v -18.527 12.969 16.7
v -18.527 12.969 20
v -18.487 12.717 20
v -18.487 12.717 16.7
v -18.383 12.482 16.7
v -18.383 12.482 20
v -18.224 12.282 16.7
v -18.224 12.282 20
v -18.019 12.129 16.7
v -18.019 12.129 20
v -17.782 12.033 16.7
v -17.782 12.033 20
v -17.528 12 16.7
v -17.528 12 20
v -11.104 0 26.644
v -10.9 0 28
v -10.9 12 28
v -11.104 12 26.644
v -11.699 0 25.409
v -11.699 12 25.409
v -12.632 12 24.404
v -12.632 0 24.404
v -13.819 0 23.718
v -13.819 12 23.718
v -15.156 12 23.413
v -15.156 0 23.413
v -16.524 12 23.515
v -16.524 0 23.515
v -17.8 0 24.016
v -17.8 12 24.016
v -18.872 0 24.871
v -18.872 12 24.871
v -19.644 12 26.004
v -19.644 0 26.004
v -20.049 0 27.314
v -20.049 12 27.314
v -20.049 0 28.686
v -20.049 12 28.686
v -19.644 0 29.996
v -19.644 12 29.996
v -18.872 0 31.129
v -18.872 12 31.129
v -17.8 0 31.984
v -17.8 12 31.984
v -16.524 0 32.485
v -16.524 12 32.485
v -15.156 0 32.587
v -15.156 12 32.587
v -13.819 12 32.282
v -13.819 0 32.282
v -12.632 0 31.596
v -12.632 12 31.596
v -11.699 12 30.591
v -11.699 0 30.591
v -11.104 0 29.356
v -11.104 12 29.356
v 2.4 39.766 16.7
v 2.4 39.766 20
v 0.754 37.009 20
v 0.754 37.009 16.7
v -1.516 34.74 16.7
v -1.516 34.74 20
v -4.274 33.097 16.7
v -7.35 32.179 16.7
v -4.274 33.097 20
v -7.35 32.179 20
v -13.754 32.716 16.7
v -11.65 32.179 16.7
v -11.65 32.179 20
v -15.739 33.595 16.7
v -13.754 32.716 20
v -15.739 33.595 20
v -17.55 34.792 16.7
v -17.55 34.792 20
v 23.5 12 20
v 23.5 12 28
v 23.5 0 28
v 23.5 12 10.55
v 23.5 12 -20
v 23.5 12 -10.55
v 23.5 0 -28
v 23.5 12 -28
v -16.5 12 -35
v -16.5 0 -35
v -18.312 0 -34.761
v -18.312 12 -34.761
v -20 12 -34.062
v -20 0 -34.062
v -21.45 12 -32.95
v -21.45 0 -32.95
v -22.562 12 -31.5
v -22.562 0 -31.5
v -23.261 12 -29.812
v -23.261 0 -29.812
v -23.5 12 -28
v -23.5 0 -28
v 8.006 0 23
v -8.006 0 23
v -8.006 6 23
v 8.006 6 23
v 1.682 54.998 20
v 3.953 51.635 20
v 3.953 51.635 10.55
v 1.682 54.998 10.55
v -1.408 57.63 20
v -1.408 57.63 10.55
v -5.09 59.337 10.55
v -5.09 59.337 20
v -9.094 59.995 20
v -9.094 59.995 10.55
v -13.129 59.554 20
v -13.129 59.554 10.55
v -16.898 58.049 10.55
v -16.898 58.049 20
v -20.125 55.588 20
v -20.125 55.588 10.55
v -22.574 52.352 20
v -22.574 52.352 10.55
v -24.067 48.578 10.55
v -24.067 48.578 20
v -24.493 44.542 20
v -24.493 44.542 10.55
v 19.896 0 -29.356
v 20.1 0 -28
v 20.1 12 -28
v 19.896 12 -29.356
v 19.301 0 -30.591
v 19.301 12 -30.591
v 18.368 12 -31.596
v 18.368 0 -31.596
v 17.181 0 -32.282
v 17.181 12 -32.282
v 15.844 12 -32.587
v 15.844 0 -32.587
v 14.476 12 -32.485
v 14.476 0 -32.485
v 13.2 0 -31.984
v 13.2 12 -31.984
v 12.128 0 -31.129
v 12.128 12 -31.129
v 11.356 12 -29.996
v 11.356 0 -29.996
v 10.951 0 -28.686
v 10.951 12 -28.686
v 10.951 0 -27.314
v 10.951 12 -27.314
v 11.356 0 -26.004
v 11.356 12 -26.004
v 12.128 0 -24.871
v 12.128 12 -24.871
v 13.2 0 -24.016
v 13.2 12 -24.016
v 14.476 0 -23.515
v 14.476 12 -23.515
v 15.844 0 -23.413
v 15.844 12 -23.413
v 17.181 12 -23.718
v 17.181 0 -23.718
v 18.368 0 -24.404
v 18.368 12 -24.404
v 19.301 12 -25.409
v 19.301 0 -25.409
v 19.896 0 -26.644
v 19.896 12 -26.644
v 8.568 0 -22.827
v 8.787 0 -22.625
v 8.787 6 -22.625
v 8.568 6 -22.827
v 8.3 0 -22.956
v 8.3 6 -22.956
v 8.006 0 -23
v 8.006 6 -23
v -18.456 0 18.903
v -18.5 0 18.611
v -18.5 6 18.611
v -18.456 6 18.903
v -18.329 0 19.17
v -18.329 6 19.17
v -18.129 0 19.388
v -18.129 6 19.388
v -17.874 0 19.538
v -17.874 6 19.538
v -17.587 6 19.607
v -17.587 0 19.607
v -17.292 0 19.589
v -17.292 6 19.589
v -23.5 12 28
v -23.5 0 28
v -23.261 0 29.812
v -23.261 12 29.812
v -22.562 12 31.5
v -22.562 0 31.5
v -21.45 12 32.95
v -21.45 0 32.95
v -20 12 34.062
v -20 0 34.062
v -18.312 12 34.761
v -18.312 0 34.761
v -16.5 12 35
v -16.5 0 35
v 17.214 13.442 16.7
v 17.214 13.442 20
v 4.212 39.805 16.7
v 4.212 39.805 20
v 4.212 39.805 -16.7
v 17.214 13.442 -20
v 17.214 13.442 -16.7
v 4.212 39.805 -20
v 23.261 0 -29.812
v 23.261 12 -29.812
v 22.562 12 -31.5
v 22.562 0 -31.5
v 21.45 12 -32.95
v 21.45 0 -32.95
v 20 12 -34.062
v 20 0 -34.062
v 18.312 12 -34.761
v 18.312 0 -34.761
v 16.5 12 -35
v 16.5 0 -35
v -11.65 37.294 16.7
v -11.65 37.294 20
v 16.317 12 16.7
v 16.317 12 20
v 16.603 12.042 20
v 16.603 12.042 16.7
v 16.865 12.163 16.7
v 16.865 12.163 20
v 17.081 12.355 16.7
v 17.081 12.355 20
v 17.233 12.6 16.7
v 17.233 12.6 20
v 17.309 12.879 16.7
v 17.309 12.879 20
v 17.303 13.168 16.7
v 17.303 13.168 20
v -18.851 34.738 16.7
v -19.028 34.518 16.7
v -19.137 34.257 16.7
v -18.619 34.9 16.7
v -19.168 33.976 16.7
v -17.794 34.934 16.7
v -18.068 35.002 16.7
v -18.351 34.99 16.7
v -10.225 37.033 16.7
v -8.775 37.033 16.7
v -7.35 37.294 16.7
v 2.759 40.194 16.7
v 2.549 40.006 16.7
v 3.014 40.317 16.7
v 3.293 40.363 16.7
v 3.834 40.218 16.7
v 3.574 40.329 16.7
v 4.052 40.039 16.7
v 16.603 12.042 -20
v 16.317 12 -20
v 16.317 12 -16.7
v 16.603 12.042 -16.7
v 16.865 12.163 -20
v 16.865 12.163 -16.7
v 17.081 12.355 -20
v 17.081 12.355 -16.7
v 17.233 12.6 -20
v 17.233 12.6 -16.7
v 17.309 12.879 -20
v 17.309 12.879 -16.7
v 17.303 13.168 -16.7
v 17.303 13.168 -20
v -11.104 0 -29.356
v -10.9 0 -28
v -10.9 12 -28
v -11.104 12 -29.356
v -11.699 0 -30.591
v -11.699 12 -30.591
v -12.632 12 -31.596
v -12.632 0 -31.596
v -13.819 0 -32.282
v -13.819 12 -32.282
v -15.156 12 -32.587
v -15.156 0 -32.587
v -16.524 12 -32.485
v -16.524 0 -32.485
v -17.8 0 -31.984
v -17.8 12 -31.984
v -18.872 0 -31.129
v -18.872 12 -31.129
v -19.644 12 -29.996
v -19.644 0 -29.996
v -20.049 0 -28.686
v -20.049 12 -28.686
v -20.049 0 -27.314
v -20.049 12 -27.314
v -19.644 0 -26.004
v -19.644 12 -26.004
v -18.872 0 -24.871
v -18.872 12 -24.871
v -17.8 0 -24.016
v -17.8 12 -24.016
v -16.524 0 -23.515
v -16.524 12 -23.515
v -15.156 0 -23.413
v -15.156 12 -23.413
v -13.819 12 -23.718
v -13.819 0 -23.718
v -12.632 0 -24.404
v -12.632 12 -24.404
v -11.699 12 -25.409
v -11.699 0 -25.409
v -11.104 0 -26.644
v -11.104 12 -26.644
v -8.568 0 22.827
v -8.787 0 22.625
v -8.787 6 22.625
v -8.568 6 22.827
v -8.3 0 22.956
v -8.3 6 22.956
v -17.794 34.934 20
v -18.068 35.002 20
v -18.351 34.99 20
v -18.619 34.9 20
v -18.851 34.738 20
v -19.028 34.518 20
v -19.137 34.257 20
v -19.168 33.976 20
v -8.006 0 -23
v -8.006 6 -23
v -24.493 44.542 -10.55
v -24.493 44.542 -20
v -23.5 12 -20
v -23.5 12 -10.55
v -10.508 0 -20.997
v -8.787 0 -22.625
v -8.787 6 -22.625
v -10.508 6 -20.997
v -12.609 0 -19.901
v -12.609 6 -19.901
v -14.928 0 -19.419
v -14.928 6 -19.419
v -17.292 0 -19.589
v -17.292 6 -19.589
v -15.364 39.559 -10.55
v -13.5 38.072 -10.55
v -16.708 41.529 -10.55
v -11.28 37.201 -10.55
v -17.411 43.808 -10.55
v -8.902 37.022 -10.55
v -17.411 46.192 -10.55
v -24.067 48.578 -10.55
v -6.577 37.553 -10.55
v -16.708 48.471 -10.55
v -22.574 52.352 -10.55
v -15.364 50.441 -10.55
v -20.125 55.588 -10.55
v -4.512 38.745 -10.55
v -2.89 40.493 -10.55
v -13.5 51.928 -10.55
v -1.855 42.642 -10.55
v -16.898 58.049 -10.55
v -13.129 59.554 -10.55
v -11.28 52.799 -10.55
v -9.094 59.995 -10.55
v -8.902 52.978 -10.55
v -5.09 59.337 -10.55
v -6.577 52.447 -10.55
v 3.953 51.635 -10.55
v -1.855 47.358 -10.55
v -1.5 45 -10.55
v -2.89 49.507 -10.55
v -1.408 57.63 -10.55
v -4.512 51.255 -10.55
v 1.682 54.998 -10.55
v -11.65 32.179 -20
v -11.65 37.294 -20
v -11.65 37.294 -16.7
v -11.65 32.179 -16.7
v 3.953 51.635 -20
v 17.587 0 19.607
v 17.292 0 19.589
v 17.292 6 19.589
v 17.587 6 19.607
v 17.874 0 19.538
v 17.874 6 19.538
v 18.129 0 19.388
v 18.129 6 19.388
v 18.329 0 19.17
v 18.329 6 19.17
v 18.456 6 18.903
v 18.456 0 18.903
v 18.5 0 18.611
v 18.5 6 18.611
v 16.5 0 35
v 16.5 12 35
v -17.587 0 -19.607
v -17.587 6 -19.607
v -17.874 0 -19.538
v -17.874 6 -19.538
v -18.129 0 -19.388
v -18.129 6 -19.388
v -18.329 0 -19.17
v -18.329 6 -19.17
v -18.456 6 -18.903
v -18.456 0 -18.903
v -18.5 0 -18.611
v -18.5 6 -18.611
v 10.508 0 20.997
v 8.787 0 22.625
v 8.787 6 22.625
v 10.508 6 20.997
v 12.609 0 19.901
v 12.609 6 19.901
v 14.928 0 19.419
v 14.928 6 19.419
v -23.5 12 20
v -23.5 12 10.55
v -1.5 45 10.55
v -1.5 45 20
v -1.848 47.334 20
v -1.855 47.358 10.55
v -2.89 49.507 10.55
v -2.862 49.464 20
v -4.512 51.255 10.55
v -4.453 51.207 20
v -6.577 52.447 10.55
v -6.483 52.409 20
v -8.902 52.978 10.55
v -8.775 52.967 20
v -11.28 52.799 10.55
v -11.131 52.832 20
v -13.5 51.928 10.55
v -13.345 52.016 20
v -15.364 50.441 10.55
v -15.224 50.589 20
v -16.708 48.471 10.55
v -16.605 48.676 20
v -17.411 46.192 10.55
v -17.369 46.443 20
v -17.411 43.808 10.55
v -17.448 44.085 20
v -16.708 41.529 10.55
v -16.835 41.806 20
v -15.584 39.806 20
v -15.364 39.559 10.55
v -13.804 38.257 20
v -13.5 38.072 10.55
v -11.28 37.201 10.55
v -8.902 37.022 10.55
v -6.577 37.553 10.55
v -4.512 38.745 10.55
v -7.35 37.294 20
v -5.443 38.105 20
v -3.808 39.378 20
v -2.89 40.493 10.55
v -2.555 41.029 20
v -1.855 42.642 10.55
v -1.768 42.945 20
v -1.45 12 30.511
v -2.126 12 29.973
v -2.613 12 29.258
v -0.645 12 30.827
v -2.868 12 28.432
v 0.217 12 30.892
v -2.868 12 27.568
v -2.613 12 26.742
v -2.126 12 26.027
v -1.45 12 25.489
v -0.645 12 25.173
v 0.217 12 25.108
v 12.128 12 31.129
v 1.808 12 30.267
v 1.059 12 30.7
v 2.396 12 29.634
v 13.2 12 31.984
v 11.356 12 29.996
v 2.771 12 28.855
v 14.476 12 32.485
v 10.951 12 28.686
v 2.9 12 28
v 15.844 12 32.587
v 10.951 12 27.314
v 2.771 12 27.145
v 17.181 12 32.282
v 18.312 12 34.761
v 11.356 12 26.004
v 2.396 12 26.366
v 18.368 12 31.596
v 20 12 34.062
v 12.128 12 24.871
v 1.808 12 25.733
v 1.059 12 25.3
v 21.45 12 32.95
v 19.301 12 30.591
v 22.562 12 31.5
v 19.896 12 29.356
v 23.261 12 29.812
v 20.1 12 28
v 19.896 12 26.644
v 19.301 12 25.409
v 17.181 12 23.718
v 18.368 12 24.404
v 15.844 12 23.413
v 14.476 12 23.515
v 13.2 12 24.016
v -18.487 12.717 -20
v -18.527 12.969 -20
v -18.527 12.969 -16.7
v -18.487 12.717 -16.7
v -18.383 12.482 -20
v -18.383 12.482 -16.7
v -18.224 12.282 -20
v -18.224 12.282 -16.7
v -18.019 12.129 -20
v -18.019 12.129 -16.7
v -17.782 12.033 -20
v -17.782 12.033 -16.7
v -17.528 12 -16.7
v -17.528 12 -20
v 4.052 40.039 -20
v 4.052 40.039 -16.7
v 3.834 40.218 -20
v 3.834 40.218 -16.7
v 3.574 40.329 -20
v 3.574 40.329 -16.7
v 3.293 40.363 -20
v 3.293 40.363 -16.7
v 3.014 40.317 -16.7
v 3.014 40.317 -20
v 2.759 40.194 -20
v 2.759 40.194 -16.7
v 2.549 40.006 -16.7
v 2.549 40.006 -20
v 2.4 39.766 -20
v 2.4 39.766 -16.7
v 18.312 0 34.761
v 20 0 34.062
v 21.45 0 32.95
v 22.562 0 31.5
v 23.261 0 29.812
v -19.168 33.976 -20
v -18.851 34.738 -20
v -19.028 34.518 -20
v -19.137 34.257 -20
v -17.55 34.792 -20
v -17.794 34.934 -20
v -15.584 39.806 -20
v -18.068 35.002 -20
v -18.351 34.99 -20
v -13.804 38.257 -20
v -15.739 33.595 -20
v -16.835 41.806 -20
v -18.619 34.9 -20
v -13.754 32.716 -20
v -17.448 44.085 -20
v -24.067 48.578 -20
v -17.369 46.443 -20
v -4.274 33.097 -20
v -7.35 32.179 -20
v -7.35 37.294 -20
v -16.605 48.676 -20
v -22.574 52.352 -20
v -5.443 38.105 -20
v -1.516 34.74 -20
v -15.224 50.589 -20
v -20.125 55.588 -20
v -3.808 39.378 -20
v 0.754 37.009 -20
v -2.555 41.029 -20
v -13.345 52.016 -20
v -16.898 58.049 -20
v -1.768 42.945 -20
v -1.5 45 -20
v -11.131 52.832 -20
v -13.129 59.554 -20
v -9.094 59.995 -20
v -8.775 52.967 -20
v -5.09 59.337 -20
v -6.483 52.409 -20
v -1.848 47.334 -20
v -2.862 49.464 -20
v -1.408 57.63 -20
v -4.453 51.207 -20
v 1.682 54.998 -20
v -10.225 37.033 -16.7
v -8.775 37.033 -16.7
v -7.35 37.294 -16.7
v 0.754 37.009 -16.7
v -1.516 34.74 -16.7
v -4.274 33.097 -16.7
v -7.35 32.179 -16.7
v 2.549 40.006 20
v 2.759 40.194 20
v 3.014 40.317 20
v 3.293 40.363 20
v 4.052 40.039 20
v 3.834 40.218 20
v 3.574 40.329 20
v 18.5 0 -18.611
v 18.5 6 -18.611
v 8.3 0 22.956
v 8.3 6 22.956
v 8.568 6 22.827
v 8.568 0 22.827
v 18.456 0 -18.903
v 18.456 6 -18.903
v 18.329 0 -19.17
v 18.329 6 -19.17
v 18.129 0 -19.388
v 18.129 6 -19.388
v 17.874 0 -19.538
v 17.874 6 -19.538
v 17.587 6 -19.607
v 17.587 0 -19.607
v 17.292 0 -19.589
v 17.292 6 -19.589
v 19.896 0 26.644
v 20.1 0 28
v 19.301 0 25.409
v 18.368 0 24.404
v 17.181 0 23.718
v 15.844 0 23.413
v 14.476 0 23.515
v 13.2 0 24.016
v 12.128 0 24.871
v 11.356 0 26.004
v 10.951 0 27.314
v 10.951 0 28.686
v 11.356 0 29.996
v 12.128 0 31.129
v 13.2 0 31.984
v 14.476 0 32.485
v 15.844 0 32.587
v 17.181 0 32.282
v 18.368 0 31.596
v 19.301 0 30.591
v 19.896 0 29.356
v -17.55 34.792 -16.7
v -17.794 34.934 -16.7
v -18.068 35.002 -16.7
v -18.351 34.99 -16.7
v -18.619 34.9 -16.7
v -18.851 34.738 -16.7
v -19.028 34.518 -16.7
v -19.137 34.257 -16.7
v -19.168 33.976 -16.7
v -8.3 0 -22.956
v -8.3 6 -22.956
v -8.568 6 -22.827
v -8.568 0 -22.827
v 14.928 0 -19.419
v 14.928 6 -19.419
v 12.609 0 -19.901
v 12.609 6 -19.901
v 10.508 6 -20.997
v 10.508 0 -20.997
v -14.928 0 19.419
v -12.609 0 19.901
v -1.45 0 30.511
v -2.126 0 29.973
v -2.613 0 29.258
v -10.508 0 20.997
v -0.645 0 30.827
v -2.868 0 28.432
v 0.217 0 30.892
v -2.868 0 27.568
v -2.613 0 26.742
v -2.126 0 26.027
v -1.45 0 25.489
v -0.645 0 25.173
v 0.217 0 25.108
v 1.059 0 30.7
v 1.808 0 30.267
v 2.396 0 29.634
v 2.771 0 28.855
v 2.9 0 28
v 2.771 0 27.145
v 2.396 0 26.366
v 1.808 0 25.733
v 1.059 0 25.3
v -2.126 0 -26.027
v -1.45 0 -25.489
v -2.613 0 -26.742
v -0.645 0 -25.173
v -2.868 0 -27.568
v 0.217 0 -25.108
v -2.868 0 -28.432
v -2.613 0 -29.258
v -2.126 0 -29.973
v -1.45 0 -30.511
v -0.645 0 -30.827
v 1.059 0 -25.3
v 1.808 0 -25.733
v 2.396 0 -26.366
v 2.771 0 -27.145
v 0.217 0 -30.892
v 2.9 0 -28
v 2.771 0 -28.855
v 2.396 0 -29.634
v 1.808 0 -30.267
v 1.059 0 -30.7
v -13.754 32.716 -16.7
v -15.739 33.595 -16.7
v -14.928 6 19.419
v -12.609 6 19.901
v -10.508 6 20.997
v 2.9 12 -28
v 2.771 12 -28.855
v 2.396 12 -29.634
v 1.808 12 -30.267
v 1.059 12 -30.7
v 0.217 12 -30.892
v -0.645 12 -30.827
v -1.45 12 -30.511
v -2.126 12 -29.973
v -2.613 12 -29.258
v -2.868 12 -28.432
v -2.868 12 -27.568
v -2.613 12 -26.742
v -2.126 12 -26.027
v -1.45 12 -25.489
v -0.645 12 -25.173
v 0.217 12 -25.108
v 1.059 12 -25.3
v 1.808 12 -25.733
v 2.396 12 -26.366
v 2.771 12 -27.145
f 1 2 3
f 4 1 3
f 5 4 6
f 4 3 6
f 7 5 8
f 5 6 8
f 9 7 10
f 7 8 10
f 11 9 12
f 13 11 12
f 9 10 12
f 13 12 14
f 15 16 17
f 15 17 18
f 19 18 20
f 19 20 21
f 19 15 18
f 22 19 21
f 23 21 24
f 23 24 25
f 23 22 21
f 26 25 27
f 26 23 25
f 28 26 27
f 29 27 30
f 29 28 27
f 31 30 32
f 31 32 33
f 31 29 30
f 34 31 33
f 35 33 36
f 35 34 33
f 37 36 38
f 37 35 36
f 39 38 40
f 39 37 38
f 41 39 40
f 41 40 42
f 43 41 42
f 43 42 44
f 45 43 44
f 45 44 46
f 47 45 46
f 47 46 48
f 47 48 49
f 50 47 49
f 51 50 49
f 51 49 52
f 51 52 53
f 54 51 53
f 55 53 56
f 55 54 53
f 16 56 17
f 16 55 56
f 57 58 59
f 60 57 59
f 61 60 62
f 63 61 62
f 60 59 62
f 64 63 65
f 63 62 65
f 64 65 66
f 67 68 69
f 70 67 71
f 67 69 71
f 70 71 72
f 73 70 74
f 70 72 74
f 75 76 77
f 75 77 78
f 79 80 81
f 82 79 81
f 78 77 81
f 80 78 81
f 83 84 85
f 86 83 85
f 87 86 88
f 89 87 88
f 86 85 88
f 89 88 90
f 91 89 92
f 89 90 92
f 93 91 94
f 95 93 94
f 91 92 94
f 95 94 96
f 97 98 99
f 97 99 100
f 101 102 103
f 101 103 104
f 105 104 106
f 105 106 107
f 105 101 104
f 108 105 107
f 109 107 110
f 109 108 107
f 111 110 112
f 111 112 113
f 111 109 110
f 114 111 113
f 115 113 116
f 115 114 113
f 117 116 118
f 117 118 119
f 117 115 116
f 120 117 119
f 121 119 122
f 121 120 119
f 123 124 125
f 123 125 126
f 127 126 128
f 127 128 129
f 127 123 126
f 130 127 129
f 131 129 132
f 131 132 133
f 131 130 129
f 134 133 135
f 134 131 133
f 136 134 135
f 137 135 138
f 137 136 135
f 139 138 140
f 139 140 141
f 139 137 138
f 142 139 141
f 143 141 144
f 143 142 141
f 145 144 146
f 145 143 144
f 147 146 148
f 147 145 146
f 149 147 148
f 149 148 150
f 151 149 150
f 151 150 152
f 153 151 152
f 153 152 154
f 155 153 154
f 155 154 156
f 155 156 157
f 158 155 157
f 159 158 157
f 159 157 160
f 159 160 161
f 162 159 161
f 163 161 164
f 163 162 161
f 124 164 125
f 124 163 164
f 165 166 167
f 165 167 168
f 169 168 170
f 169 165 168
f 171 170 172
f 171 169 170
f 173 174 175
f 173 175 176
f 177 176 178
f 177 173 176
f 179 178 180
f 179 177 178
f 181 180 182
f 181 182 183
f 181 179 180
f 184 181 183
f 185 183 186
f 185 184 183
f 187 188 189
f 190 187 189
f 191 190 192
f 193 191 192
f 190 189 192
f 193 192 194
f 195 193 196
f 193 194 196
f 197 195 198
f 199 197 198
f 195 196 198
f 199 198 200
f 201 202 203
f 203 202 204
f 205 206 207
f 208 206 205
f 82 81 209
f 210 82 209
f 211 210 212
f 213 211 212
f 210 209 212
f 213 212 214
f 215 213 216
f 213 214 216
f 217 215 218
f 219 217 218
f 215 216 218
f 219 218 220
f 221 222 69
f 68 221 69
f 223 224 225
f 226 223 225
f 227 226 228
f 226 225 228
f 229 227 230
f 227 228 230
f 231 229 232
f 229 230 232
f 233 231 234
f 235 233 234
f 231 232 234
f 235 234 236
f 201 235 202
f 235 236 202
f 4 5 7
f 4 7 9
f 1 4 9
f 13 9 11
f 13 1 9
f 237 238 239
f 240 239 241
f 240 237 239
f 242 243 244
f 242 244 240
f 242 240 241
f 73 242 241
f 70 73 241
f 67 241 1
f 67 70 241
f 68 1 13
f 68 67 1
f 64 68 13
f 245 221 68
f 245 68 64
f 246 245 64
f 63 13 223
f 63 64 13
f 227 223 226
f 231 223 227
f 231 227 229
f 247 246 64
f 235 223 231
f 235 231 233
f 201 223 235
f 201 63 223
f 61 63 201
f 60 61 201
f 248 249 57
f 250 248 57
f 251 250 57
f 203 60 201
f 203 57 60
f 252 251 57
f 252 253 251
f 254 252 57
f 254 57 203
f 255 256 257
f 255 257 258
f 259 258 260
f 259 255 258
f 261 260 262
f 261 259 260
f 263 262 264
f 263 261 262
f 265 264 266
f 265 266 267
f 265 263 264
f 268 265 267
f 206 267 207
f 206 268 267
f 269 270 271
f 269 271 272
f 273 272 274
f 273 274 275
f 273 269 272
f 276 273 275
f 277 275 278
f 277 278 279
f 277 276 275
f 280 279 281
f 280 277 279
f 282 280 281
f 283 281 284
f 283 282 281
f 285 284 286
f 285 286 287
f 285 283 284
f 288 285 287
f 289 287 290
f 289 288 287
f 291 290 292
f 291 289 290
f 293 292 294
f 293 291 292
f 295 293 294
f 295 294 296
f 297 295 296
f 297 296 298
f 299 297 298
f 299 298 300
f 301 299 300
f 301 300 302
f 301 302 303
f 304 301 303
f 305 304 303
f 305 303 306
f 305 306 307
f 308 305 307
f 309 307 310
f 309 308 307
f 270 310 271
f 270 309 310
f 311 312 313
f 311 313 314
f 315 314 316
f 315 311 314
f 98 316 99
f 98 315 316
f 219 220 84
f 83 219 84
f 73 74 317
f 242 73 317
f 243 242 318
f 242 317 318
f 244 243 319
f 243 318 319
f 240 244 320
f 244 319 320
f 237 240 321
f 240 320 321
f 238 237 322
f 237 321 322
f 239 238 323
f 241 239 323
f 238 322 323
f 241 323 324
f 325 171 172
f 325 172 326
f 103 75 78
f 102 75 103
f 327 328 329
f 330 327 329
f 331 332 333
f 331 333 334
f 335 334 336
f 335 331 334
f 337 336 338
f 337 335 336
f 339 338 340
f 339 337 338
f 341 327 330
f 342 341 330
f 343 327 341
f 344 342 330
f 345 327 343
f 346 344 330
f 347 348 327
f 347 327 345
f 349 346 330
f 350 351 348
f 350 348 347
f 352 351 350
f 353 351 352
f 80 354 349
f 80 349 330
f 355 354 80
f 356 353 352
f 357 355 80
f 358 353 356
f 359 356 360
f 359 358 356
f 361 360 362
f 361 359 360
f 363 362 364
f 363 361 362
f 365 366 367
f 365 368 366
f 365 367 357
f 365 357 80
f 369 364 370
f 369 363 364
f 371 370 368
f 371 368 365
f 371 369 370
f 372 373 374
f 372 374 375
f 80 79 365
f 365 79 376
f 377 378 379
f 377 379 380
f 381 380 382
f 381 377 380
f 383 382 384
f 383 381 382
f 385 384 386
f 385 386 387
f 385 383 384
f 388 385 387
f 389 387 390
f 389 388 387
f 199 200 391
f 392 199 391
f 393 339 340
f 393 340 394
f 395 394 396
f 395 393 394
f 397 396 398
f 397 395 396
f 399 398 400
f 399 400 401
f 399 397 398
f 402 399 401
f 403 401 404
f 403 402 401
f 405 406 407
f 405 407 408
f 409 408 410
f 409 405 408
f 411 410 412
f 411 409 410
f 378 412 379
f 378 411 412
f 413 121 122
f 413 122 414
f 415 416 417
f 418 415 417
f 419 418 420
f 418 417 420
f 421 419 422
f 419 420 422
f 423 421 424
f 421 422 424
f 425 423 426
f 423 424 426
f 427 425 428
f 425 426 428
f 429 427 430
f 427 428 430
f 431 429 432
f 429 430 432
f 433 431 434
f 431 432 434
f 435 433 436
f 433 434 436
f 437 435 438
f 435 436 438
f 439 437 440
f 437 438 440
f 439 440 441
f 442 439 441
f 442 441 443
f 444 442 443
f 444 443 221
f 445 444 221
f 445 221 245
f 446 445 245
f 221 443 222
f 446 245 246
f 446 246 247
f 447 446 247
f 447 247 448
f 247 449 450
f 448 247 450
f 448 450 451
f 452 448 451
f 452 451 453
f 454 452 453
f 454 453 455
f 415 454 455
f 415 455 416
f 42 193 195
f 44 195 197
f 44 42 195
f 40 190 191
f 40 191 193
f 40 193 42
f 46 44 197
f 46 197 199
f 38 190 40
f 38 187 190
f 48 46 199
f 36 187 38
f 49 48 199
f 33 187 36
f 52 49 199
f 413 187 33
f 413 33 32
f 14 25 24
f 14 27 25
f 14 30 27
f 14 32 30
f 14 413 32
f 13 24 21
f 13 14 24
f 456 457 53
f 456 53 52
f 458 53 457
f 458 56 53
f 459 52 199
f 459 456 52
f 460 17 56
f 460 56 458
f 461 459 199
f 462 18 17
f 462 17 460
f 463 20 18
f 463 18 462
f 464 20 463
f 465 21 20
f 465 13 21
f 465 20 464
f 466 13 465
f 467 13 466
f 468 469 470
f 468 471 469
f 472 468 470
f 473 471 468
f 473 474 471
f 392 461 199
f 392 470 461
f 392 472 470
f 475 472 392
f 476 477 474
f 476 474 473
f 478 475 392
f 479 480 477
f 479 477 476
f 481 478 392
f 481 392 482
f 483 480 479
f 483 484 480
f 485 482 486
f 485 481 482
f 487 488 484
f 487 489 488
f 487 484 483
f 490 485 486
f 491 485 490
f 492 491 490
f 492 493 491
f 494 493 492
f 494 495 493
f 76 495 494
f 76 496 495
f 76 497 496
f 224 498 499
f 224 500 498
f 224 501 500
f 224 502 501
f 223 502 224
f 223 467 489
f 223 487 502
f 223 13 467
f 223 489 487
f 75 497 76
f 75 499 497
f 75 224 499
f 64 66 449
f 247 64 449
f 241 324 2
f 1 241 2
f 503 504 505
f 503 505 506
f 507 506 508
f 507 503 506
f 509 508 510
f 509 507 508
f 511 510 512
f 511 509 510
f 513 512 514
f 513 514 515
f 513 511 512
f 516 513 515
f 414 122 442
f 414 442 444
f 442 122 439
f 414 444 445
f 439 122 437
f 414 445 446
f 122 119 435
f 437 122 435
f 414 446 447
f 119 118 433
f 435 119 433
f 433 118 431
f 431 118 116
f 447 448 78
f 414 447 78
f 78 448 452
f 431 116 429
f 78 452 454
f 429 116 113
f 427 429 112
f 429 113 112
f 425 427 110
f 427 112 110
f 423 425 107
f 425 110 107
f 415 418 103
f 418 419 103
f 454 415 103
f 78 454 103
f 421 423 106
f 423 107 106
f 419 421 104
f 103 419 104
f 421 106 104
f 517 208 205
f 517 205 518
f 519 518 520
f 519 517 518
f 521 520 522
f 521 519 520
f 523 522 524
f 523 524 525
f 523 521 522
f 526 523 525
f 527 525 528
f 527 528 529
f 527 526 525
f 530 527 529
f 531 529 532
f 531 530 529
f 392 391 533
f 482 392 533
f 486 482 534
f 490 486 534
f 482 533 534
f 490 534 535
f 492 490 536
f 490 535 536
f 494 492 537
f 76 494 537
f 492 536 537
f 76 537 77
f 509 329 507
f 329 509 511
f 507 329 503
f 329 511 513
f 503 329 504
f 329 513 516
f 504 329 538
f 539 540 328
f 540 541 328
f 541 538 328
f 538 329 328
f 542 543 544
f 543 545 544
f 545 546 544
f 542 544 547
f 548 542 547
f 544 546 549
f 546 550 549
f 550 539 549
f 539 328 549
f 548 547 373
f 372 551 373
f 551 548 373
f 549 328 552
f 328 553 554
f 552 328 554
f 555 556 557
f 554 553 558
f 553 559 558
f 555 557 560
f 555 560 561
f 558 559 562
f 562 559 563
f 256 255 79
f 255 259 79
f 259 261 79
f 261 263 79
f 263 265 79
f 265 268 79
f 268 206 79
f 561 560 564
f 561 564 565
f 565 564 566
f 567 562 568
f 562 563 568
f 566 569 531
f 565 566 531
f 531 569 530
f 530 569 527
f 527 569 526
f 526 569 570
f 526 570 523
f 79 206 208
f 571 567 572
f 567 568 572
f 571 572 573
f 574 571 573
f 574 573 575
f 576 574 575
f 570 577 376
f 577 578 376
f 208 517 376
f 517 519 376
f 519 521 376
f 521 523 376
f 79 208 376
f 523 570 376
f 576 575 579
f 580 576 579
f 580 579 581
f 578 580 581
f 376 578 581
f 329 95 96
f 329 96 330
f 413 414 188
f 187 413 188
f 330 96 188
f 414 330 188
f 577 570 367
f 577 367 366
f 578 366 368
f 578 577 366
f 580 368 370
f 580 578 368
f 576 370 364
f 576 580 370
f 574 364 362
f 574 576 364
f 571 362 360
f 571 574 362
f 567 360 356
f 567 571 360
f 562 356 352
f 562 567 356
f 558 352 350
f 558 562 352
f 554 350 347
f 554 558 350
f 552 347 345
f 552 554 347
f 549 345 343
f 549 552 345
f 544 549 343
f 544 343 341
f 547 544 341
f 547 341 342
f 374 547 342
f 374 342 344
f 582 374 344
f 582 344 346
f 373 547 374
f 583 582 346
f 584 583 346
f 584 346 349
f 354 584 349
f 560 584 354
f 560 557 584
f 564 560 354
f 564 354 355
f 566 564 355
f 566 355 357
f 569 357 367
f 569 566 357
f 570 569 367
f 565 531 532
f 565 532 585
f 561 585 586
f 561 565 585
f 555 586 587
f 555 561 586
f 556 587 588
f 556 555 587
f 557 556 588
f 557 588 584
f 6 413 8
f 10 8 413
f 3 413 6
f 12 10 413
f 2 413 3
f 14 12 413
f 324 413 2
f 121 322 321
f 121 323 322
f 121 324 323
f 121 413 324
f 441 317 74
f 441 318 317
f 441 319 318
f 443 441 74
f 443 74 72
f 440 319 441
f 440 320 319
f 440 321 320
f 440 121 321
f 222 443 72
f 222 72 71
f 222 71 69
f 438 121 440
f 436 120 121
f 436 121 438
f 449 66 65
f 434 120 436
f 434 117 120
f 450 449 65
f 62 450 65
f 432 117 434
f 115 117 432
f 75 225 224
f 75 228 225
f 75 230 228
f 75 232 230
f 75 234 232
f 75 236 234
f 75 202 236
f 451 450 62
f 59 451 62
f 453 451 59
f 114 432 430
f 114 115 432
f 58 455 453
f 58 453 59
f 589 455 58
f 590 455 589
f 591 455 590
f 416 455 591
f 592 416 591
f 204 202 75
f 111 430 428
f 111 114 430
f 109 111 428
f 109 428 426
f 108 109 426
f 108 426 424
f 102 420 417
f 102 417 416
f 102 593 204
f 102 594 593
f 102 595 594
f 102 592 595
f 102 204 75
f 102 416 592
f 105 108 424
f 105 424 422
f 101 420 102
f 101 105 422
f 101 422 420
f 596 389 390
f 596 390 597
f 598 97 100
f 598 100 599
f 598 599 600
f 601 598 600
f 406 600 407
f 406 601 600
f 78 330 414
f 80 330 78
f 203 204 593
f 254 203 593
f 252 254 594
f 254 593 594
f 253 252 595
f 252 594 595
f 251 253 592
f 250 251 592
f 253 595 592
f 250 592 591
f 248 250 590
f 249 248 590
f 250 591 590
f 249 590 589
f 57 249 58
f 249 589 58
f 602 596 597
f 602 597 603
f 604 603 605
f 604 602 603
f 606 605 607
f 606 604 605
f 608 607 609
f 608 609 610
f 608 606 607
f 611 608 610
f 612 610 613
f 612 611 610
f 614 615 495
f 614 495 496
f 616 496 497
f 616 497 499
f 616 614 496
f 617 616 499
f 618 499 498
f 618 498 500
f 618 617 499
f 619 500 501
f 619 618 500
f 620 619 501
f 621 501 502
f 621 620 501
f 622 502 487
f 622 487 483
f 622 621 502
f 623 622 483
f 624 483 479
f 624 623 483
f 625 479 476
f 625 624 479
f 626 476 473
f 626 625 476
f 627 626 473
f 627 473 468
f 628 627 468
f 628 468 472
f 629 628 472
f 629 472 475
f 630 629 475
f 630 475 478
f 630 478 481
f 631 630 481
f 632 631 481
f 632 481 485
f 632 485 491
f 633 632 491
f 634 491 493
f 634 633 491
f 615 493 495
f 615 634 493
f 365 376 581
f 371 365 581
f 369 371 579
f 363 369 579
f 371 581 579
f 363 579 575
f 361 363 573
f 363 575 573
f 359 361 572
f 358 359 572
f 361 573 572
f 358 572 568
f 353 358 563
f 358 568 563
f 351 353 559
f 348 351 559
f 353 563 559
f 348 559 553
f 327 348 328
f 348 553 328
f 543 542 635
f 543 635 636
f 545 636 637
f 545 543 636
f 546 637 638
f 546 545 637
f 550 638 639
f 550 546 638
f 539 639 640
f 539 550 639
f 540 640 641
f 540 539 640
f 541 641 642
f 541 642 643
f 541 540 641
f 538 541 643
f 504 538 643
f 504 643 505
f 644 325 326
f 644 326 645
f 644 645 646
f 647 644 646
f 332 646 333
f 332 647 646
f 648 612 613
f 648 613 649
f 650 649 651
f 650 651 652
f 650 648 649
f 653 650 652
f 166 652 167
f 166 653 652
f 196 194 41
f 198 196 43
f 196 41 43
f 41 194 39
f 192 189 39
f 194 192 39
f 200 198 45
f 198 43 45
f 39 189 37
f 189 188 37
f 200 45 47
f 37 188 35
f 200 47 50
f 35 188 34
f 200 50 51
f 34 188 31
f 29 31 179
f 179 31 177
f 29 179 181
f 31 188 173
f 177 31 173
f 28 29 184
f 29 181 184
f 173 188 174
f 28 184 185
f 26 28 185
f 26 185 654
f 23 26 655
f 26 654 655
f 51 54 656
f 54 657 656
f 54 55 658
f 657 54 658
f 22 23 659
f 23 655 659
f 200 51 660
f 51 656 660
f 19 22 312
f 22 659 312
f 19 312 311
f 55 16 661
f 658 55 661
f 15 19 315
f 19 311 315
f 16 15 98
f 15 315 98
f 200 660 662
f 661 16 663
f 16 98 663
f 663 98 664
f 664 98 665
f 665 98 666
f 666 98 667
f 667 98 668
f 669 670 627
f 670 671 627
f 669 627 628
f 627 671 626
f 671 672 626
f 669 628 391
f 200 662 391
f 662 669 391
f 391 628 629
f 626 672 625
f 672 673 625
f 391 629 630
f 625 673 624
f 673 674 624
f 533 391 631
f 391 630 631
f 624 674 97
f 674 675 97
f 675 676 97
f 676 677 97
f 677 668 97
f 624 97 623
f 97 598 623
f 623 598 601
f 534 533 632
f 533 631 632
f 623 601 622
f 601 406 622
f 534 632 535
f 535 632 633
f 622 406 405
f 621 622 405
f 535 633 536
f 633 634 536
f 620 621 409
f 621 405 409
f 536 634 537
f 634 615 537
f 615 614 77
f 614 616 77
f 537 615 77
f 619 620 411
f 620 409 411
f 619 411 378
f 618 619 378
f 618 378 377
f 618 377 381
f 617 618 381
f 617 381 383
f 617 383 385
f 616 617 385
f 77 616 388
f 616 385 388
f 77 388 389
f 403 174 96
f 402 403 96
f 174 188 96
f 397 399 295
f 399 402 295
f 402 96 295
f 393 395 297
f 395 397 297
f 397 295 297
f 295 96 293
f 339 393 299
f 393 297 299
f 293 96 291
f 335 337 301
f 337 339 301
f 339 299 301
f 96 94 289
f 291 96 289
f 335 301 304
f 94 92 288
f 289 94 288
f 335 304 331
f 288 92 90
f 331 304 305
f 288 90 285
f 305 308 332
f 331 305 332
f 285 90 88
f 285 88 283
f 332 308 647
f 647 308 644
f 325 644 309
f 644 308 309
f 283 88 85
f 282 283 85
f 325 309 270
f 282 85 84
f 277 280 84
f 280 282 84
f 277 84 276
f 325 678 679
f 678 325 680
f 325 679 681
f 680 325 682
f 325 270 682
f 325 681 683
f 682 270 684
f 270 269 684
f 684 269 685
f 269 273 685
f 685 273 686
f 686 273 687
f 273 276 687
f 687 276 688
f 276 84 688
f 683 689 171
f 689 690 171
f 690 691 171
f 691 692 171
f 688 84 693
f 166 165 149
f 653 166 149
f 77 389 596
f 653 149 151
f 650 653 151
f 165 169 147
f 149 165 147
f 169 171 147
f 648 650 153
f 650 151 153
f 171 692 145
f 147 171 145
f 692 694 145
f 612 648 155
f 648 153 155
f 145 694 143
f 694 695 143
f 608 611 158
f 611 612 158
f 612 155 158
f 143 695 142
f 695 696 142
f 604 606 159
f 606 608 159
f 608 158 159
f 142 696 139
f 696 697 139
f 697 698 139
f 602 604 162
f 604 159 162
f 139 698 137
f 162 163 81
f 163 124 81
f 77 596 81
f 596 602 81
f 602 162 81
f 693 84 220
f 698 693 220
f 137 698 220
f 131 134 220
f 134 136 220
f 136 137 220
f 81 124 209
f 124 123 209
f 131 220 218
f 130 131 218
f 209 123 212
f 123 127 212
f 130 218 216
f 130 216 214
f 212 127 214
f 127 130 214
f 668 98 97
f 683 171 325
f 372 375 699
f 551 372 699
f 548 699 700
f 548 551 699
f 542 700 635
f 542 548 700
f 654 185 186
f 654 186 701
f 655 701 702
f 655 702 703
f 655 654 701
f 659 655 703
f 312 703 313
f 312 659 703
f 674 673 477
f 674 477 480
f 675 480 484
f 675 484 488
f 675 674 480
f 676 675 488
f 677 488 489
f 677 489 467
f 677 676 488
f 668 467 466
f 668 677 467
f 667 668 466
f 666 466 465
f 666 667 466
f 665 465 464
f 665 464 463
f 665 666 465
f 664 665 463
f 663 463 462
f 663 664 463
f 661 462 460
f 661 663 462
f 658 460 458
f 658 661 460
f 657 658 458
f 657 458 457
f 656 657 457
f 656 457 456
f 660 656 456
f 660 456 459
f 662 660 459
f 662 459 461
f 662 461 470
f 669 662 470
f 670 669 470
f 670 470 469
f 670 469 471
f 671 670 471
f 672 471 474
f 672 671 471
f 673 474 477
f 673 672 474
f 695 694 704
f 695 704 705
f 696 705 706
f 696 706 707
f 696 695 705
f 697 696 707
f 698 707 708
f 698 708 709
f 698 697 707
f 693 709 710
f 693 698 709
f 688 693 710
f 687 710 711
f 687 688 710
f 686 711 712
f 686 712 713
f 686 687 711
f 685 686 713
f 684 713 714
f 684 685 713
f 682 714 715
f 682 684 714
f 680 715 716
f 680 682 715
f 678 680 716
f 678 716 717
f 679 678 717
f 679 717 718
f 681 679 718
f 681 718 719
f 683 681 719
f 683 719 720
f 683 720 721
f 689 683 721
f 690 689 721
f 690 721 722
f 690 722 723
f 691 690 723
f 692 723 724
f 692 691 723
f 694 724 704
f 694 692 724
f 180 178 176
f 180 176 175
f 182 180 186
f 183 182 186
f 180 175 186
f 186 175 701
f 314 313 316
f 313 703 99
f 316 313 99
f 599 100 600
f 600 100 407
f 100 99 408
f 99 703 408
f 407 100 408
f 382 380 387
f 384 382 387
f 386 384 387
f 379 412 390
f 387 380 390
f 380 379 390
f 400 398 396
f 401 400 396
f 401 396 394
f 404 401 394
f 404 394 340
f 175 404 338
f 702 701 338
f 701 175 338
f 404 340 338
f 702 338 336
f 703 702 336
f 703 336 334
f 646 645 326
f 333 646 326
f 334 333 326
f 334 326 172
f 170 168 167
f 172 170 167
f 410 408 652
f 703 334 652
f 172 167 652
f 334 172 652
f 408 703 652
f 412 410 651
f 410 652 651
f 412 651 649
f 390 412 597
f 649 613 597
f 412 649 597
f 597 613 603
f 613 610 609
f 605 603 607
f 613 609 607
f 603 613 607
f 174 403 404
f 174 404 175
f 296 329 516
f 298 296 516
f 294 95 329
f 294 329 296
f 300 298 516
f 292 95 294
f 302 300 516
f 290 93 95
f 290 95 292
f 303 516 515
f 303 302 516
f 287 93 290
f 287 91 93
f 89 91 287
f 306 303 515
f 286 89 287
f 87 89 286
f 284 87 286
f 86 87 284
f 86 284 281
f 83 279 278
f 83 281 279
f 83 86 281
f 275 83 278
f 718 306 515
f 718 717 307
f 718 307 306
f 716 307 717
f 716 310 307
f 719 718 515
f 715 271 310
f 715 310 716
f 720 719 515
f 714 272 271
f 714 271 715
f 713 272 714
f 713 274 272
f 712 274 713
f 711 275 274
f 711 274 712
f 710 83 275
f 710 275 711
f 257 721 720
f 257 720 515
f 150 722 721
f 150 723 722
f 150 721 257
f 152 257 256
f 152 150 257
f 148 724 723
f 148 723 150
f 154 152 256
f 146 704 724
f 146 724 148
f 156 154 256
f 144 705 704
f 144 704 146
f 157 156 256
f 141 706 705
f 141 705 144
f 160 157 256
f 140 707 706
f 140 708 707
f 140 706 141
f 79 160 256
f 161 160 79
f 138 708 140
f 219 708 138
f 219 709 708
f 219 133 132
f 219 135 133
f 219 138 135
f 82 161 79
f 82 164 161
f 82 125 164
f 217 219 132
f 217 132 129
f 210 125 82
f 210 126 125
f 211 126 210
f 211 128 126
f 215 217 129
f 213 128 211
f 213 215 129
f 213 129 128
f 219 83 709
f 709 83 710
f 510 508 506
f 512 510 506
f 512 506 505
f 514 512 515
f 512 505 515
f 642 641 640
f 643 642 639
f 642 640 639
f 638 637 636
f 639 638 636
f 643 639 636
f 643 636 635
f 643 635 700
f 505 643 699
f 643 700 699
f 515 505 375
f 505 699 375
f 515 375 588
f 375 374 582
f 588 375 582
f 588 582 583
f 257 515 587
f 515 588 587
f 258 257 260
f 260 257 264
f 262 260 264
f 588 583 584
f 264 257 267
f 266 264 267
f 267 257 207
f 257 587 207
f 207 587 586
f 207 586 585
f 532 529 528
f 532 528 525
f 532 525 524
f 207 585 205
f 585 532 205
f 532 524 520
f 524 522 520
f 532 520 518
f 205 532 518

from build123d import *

# Parameters (mm, degrees)
SKETCH1_R               = 4.6
SKETCH1_R_2             = 2.9
BOSS_EXTRUDE1_DEPTH     = 12
CUT_EXTRUDE1_DEPTH      = 6
SKETCH3_R               = 8
BOSS_EXTRUDE2_DEPTH     = 9.45
CUT_EXTRUDE2_DEPTH      = 3.3
SKETCH5_R               = 8
BOSS_EXTRUDE3_DEPTH     = 9.45
CUT_EXTRUDE3_DEPTH      = 3.3
CUT_EXTRUDE4_DEPTH      = 3.3
CUT_EXTRUDE4_DEPTH_BACK = 3.3
CUT_EXTRUDE5_DEPTH      = 3.3
CUT_EXTRUDE5_DEPTH_BACK = 3.3


with BuildPart() as part:
    # Sketch1 → Boss-Extrude1 (new body)
    with BuildSketch(Plane(origin=(0, 0, 0), x_dir=(1, 0, 0), z_dir=(0, 1, 0))):
        with BuildLine():
            Line((-16.5, -35), (16.5, -35))
            ThreePointArc((16.5, -35), (21.449747468, -32.949747468), (23.5, -28))
            Line((23.5, -28), (23.5, 28))
            ThreePointArc((23.5, 28), (21.449747468, 32.949747468), (16.5, 35))
            Line((16.5, 35), (-16.5, 35))
            ThreePointArc((-16.5, 35), (-21.449747468, 32.949747468), (-23.5, 28))
            Line((-23.5, 28), (-23.5, -28))
            ThreePointArc((-23.5, -28), (-21.449747468, -32.949747468), (-16.5, -35))
        make_face()
        with Locations((15.5, 28)):
            Circle(SKETCH1_R, mode=Mode.SUBTRACT)
        with Locations((15.5, -28)):
            Circle(SKETCH1_R, mode=Mode.SUBTRACT)
        with Locations((0, 28)):
            Circle(SKETCH1_R_2, mode=Mode.SUBTRACT)
        with Locations((0, -28)):
            Circle(SKETCH1_R_2, mode=Mode.SUBTRACT)
        with Locations((-15.5, 28)):
            Circle(SKETCH1_R, mode=Mode.SUBTRACT)
        with Locations((-15.5, -28)):
            Circle(SKETCH1_R, mode=Mode.SUBTRACT)
    extrude(amount=BOSS_EXTRUDE1_DEPTH)

    # Sketch2 → Cut-Extrude1 (cut)
    with BuildSketch(Plane(origin=(0, 0, 0), x_dir=(1, 0, 0), z_dir=(0, 1, 0))):
        with BuildLine():
            Line((-8.006002402, -23), (8.006002402, -23))
            ThreePointArc((8.006002402, -23), (8.439015104, -22.901387819), (8.786627152, -22.625))
            ThreePointArc((8.786627152, -22.625), (12.608534281, -19.900652743), (17.291666667, -19.588702207))
            ThreePointArc((17.291666667, -19.588702207), (18.12915287, -19.387925912), (18.5, -18.610644325))
            Line((18.5, -18.610644325), (18.5, 18.610644325))
            ThreePointArc((18.5, 18.610644325), (18.129152893, 19.387925893), (17.291666727, 19.58870222))
            ThreePointArc((17.291666727, 19.58870222), (12.60853431, 19.900652732), (8.786627152, 22.625))
            ThreePointArc((8.786627152, 22.625), (8.439015104, 22.901387819), (8.006002402, 23))
            Line((8.006002402, 23), (-8.006002402, 23))
            ThreePointArc((-8.006002402, 23), (-8.439015104, 22.901387819), (-8.786627152, 22.625))
            ThreePointArc((-8.786627152, 22.625), (-12.608534281, 19.900652743), (-17.291666667, 19.588702207))
            ThreePointArc((-17.291666667, 19.588702207), (-18.12915287, 19.387925912), (-18.5, 18.610644325))
            Line((-18.5, 18.610644325), (-18.5, -18.610644325))
            ThreePointArc((-18.5, -18.610644325), (-18.129152893, -19.387925893), (-17.291666727, -19.58870222))
            ThreePointArc((-17.291666727, -19.58870222), (-12.60853431, -19.900652732), (-8.786627152, -22.625))
            ThreePointArc((-8.786627152, -22.625), (-8.439015104, -22.901387819), (-8.006002402, -23))
        make_face()
    extrude(amount=CUT_EXTRUDE1_DEPTH, mode=Mode.SUBTRACT)

    # Sketch3 → Boss-Extrude2 (add)
    with BuildSketch(Plane.XY.offset(20)):
        with BuildLine():
            Line((-24.493021315, 44.542493891), (-23.5, 12))
            Line((-23.5, 12), (23.5, 12))
            Line((23.5, 12), (3.952899906, 51.634718088))
            ThreePointArc((3.952899906, 51.634718088), (-13.128760739, 59.554452772), (-24.493021315, 44.542493891))
        make_face()
        with Locations((-9.5, 45)):
            Circle(SKETCH3_R, mode=Mode.SUBTRACT)
    extrude(amount=-BOSS_EXTRUDE2_DEPTH)

    # Sketch4 → Cut-Extrude2 (cut)
    with BuildSketch(Plane.XY.offset(20)):
        with BuildLine():
            Line((-19.168267115, 33.976179837), (-18.527256585, 12.969499593))
            ThreePointArc((-18.527256585, 12.969499593), (-18.223961586, 12.282190691), (-17.527721831, 12))
            Line((-17.527721831, 12), (16.316811337, 12))
            ThreePointArc((16.316811337, 12), (17.166021129, 12.471944387), (17.213671331, 13.442314539))
            Line((17.213671331, 13.442314539), (4.211894935, 39.805393442))
            ThreePointArc((4.211894935, 39.805393442), (3.293145866, 40.362839309), (2.399675303, 39.765716124))
            ThreePointArc((2.399675303, 39.765716124), (-6.355074026, 32.386140931), (-17.549537192, 34.791917369))
            ThreePointArc((-17.549537192, 34.791917369), (-18.618756227, 34.899696772), (-19.168267115, 33.976179837))
        make_face()
    extrude(amount=-CUT_EXTRUDE2_DEPTH, mode=Mode.SUBTRACT)

    # Sketch5 → Boss-Extrude3 (add)
    with BuildSketch(Plane.XY.offset(-20)):
        with BuildLine():
            Line((-24.493021315, 44.542493891), (-23.5, 12))
            Line((-23.5, 12), (23.5, 12))
            Line((23.5, 12), (3.952899906, 51.634718088))
            ThreePointArc((3.952899906, 51.634718088), (-13.128760739, 59.554452772), (-24.493021315, 44.542493891))
        make_face()
        with Locations((-9.5, 45)):
            Circle(SKETCH5_R, mode=Mode.SUBTRACT)
    extrude(amount=BOSS_EXTRUDE3_DEPTH)

    # Sketch6 → Cut-Extrude3 (cut)
    with BuildSketch(Plane.XY.offset(-20)):
        with BuildLine():
            Line((-19.168267115, 33.976179837), (-18.527256585, 12.969499593))
            ThreePointArc((-18.527256585, 12.969499593), (-18.223961586, 12.282190691), (-17.527721831, 12))
            Line((-17.527721831, 12), (16.316811337, 12))
            ThreePointArc((16.316811337, 12), (17.166021129, 12.471944387), (17.213671331, 13.442314539))
            Line((17.213671331, 13.442314539), (4.211894935, 39.805393442))
            ThreePointArc((4.211894935, 39.805393442), (3.293145866, 40.362839309), (2.399675303, 39.765716124))
            ThreePointArc((2.399675303, 39.765716124), (-6.355074026, 32.386140931), (-17.549537192, 34.791917369))
            ThreePointArc((-17.549537192, 34.791917369), (-18.618756227, 34.899696772), (-19.168267115, 33.976179837))
        make_face()
    extrude(amount=CUT_EXTRUDE3_DEPTH, mode=Mode.SUBTRACT)

    # Sketch7 → Cut-Extrude4 (cut, two sides)
    with BuildSketch(Plane.XY.offset(20)) as cut_extrude4_sk:
        with BuildLine():
            Line((-7.35, 30.15), (-7.35, 45))
            Line((-7.35, 45), (-11.65, 45))
            Line((-11.65, 45), (-11.65, 30.15))
            ThreePointArc((-11.65, 30.15), (-9.5, 28), (-7.35, 30.15))
        make_face()
    extrude(amount=CUT_EXTRUDE4_DEPTH, mode=Mode.SUBTRACT)
    extrude(cut_extrude4_sk.sketch, amount=-CUT_EXTRUDE4_DEPTH_BACK, mode=Mode.SUBTRACT)

    # Sketch8 → Cut-Extrude5 (cut, two sides)
    with BuildSketch(Plane.XY.offset(-20)) as cut_extrude5_sk:
        with BuildLine():
            Line((-7.35, 30.15), (-7.35, 45))
            Line((-7.35, 45), (-11.65, 45))
            Line((-11.65, 45), (-11.65, 30.15))
            ThreePointArc((-11.65, 30.15), (-9.5, 28), (-7.35, 30.15))
        make_face()
    extrude(amount=CUT_EXTRUDE5_DEPTH, mode=Mode.SUBTRACT)
    extrude(cut_extrude5_sk.sketch, amount=-CUT_EXTRUDE5_DEPTH_BACK, mode=Mode.SUBTRACT)


solid = part.part
